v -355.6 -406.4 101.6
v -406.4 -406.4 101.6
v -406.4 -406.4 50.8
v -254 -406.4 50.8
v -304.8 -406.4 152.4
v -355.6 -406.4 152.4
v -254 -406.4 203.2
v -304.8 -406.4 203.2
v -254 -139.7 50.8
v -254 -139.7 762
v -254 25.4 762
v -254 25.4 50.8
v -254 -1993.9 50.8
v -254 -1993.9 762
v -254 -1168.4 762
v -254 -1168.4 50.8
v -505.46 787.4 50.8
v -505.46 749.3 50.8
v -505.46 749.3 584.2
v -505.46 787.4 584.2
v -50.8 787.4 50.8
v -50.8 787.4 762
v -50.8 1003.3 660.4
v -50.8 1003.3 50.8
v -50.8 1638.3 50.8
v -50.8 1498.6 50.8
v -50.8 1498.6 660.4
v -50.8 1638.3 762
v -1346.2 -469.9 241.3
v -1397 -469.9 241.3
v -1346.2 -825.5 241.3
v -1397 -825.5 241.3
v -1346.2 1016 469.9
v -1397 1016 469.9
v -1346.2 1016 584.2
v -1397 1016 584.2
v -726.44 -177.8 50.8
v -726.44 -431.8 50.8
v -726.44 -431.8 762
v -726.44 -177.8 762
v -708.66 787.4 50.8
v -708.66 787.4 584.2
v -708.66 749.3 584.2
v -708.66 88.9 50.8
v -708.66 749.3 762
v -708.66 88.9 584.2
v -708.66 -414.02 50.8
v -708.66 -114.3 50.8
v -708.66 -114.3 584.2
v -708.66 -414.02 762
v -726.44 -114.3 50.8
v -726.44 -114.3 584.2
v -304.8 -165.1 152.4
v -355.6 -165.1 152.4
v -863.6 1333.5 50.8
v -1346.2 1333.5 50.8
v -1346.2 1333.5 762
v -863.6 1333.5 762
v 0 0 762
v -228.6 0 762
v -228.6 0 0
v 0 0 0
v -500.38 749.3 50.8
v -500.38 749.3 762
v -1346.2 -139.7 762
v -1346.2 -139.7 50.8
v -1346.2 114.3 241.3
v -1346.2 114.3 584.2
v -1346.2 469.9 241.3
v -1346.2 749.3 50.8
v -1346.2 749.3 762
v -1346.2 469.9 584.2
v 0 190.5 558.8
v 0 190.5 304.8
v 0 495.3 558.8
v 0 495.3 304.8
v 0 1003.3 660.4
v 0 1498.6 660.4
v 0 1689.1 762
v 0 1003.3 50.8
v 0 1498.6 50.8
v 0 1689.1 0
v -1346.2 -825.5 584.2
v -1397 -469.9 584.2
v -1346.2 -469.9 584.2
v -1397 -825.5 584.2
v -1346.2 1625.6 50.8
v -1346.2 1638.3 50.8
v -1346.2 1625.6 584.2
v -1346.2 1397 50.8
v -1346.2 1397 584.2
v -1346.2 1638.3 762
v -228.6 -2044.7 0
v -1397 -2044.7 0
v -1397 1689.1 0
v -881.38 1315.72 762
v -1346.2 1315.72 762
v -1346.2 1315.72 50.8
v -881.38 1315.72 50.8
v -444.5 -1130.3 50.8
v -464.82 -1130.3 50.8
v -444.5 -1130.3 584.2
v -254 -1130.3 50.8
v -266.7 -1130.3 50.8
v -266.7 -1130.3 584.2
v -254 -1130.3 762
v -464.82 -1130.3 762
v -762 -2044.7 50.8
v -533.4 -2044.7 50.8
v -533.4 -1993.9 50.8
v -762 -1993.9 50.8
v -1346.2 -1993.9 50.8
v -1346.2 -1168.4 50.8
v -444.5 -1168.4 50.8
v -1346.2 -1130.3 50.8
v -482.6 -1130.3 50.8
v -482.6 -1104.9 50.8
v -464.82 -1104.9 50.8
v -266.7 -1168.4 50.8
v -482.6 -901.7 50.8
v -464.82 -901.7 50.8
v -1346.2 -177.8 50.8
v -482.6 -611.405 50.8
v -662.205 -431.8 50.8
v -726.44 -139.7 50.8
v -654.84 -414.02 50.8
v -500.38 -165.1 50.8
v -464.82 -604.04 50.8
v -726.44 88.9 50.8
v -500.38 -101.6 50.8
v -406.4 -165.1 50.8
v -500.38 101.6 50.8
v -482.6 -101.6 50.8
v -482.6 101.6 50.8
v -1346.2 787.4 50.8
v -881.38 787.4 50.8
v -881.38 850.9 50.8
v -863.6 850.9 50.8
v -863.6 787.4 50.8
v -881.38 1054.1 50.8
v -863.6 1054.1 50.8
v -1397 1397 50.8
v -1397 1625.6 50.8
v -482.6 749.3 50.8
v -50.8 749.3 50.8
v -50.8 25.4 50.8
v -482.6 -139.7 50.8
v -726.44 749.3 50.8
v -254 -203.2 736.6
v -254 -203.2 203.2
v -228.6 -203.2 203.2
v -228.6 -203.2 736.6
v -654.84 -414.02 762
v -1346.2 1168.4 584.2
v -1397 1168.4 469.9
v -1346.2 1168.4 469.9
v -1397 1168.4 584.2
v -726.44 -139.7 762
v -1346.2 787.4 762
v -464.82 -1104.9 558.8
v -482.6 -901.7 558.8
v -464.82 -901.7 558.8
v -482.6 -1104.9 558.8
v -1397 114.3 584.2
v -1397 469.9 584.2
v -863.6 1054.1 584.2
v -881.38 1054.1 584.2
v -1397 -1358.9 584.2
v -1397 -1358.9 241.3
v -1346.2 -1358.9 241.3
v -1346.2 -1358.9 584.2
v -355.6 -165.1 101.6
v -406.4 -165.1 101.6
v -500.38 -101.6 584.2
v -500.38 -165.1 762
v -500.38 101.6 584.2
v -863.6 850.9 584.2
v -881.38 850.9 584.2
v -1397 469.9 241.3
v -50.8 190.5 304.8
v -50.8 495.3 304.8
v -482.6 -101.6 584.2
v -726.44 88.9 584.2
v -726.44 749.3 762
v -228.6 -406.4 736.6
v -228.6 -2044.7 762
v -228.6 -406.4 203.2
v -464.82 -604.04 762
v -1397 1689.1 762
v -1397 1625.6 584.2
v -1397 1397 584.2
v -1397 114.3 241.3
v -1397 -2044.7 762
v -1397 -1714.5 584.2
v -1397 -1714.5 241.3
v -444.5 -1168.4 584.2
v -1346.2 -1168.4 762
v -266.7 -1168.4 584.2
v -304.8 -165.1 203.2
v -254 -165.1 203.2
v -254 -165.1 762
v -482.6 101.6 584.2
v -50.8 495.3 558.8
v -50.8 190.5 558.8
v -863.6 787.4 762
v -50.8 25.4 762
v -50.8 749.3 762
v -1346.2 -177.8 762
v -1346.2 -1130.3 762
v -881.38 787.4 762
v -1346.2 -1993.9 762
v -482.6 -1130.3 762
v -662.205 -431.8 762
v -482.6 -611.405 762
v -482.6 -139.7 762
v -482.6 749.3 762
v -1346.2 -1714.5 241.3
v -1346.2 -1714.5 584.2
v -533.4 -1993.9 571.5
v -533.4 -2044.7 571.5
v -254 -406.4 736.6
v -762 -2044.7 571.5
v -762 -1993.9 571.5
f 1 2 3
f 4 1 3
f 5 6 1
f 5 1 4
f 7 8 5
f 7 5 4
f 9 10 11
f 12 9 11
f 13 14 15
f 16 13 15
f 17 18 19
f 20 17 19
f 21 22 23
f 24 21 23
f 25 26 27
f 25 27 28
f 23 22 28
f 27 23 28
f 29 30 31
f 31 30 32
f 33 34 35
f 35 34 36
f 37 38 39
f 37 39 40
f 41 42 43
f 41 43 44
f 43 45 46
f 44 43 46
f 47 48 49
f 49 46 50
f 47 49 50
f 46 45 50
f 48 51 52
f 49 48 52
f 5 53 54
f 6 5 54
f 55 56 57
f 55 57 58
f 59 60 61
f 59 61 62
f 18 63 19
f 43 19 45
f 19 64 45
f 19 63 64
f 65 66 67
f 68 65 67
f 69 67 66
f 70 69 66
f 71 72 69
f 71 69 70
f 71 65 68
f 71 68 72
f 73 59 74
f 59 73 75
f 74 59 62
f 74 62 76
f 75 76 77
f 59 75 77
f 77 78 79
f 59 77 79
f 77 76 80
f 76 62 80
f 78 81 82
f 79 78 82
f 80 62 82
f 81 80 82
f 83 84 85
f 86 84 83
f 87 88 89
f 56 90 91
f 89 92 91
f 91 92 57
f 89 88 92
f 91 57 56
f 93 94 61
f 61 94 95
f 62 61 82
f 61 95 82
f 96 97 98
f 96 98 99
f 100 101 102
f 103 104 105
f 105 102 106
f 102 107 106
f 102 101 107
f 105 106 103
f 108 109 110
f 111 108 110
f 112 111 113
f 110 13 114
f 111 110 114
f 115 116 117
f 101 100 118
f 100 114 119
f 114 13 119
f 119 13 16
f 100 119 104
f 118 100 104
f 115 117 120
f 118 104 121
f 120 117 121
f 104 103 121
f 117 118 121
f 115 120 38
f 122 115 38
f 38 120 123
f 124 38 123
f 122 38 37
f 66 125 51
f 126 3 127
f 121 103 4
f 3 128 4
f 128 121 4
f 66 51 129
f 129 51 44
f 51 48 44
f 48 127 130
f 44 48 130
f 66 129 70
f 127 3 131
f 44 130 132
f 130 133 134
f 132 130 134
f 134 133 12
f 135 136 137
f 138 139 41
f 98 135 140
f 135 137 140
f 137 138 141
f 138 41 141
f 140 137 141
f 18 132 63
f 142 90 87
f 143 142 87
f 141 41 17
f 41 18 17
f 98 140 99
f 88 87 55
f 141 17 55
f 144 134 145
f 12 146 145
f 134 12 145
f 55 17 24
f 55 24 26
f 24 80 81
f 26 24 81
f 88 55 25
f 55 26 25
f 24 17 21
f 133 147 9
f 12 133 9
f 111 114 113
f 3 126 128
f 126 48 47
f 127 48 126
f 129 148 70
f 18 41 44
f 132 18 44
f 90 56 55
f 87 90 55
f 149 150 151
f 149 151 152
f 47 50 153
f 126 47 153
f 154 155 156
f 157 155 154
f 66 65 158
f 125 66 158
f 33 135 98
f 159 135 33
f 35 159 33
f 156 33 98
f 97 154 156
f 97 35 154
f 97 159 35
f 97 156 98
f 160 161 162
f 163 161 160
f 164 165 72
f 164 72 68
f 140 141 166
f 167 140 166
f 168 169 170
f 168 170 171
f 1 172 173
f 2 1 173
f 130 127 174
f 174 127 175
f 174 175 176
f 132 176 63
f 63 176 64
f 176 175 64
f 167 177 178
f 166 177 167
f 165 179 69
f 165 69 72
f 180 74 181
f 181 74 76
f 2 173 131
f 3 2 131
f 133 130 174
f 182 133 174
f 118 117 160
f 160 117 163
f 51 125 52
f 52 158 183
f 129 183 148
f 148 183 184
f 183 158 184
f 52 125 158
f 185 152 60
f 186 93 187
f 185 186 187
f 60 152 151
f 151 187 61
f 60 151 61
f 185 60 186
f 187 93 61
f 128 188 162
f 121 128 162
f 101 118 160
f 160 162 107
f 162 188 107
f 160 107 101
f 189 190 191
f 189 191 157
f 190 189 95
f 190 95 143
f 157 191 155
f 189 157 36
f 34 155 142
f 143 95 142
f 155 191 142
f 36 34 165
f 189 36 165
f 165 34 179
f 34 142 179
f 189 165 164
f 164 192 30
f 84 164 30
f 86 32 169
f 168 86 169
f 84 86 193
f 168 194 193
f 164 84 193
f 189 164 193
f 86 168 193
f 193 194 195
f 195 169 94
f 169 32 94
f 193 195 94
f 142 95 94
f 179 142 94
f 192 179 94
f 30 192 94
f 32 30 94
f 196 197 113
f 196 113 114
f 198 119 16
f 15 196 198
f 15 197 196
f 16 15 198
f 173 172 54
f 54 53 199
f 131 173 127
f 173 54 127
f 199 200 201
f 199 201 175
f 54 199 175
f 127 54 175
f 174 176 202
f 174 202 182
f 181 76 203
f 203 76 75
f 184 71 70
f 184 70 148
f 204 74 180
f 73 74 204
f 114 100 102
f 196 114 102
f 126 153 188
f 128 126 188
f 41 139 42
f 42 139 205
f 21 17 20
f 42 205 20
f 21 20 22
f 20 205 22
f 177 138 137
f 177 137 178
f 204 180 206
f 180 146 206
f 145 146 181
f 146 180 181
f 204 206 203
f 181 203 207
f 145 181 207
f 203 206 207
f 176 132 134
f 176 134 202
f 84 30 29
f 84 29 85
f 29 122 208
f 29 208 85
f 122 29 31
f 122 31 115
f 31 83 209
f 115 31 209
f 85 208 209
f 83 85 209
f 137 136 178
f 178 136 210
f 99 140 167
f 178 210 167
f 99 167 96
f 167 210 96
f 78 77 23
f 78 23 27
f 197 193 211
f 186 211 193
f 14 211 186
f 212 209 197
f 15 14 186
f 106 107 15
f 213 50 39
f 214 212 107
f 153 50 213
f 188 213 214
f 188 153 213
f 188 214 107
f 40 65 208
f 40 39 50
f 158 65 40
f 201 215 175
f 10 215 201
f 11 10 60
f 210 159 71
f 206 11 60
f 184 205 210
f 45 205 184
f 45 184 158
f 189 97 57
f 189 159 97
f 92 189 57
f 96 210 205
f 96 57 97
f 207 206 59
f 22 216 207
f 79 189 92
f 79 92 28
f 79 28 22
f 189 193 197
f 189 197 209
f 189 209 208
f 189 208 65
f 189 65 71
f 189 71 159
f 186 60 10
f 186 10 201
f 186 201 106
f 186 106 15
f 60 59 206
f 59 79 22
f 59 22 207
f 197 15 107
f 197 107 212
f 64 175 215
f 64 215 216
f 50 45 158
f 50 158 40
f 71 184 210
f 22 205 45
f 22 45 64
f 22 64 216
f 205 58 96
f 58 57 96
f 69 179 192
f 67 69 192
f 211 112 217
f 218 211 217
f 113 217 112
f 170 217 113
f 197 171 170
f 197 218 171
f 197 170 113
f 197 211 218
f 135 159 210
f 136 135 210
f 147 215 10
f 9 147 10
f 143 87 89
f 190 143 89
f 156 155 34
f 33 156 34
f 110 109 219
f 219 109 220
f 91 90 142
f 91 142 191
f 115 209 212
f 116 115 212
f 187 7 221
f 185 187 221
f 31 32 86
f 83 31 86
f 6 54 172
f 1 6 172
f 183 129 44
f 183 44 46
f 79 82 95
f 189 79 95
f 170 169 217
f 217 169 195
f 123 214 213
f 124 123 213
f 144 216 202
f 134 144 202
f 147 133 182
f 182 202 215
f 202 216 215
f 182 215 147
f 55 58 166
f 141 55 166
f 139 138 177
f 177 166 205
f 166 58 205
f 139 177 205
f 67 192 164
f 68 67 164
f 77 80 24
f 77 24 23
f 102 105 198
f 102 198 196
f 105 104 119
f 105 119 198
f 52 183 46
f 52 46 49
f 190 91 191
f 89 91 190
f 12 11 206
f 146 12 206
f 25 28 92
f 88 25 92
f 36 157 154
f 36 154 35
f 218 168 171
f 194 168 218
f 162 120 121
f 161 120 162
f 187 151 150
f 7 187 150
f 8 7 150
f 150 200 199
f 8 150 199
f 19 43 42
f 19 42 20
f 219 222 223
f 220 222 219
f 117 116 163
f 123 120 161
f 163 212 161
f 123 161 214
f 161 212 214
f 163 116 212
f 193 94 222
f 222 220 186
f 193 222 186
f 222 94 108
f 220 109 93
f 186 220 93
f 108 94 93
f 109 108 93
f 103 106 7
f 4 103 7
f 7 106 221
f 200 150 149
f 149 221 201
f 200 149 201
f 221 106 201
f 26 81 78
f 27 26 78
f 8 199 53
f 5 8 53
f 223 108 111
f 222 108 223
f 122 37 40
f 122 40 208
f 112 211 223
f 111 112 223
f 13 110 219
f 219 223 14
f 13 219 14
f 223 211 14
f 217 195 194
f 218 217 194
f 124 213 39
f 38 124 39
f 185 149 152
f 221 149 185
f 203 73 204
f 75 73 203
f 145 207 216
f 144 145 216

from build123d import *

# Parameters (mm, degrees)
F1_DEPTH  = 762
F3_DEPTH  = 711.2
F4_W      = 464.82
F4_H      = 528.32
F5_DEPTH  = 711.2
F6_W      = 619.76
F6_H      = 889
F7_DEPTH  = 711.2
F8_W      = 1092.2
F8_H      = 825.5
F9_DEPTH  = 711.2
F11_DEPTH = 711.2
F13_DEPTH = 711.2
F15_DEPTH = 711.2
F16_W     = 203.2
F16_H     = 533.4
F17_DEPTH = 25.4
F18_W     = 203.2
F18_H     = 508
F19_DEPTH = 17.78
F20_W     = 203.2
F20_H     = 533.4
F21_DEPTH = 17.78
F22_W     = 177.8
F22_H     = 533.4
F23_DEPTH = 38.1
F24_W     = 203.2
F24_H     = 533.4
F25_DEPTH = 38.1
F26_W     = 203.2
F26_H     = 533.4
F27_DEPTH = 17.78
F28_W     = 228.6
F28_H     = 533.4
F29_DEPTH = 50.8
F30_W     = 355.6
F30_H     = 342.9
F30_W_2   = 152.4
F30_H_2   = 114.3
F31_DEPTH = 50.8
F32_W     = 304.8
F32_H     = 254
F32_W_2   = 495.3
F32_H_2   = 609.6
F33_DEPTH = 50.8
F34_W     = 228.6
F34_H     = 520.7
F35_DEPTH = 50.8
F37_DEPTH = 241.3
F38_W     = 203.2
F38_H     = 533.4
F39_DEPTH = 17.78


with BuildPart() as f1:
    # F0 (on Top) → F1 (new body)
    with BuildSketch(Plane.XY):
        Polygon((-1397, 1689.1), (-1397, -2044.7), (-228.6, -2044.7), (-228.6, 0), (0, 0), (0, 1689.1), align=None)
    extrude(amount=F1_DEPTH)

    # F2 (on face) → F3 (cut)
    with BuildSketch(Plane.XY.offset(762)):
        Polygon((-50.8, 1638.3), (-1346.2, 1638.3), (-1346.2, 1333.5), (-863.6, 1333.5), (-863.6, 787.4), (-50.8, 787.4), align=None)
    extrude(amount=-F3_DEPTH, mode=Mode.SUBTRACT)

    # F4 (on face) → F5 (cut)
    with BuildSketch(Plane.XY.offset(762)):
        with Locations((-1113.79, 1051.56)):
            Rectangle(F4_W, F4_H)
    extrude(amount=-F5_DEPTH, mode=Mode.SUBTRACT)

    # F6 (on face) → F7 (cut)
    with BuildSketch(Plane.XY.offset(762)):
        with Locations((-1036.32, 304.8)):
            Rectangle(F6_W, F6_H)
    extrude(amount=-F7_DEPTH, mode=Mode.SUBTRACT)

    # F8 (on face) → F9 (cut)
    with BuildSketch(Plane.XY.offset(762)):
        with Locations((-800.1, -1581.15)):
            Rectangle(F8_W, F8_H)
    extrude(amount=-F9_DEPTH, mode=Mode.SUBTRACT)

    # F10 (on face) → F11 (cut)
    with BuildSketch(Plane.XY.offset(762)):
        Polygon((-726.44, -177.8), (-1346.2, -177.8), (-1346.2, -1130.3), (-482.6, -1130.3), (-482.6, -611.405122), (-662.205122, -431.8), (-726.44, -431.8), align=None)
    extrude(amount=-F11_DEPTH, mode=Mode.SUBTRACT)

    # F12 (on face) → F13 (cut)
    with BuildSketch(Plane.XY.offset(762)):
        Polygon((-50.8, 749.3), (-482.6, 749.3), (-482.6, -139.7), (-254, -139.7), (-254, 25.4), (-50.8, 25.4), align=None)
    extrude(amount=-F13_DEPTH, mode=Mode.SUBTRACT)

    # F14 (on face) → F15 (cut)
    with BuildSketch(Plane.XY.offset(762)):
        Polygon((-500.38, 749.3), (-708.66, 749.3), (-708.66, -414.02), (-654.840405, -414.02), (-464.82, -604.040405), (-464.82, -1130.3), (-254, -1130.3), (-254, -165.1), (-500.38, -165.1), align=None)
    extrude(amount=-F15_DEPTH, mode=Mode.SUBTRACT)

    # F16 (on face) → F17 (cut, through all)
    with BuildSketch(Plane(origin=(-254, 0, 0), x_dir=(0, -1, 0), z_dir=(-1, 0, 0))):
        with Locations((304.8, 469.9)):
            Rectangle(F16_W, F16_H)
    extrude(amount=-F17_DEPTH, mode=Mode.SUBTRACT)

    # F18 (on face) → F19 (cut, through all)
    with BuildSketch(Plane(origin=(-482.6, 0, 0), x_dir=(0, -1, 0), z_dir=(-1, 0, 0))):
        with Locations((1003.3, 304.8)):
            Rectangle(F18_W, F18_H)
    extrude(amount=-F19_DEPTH, mode=Mode.SUBTRACT)

    # F20 (on face) → F21 (cut, through all)
    with BuildSketch(Plane(origin=(-726.44, 0, 0), x_dir=(0, -1, 0), z_dir=(-1, 0, 0))):
        with Locations((12.7, 317.5)):
            Rectangle(F20_W, F20_H)
    extrude(amount=-F21_DEPTH, mode=Mode.SUBTRACT)

    # F22 (on face) → F23 (cut, through all)
    with BuildSketch(Plane(origin=(0, -1130.3, 0), x_dir=(-1, 0, 0), z_dir=(0, 1, 0))):
        with Locations((355.6, 317.5)):
            Rectangle(F22_W, F22_H)
    extrude(amount=-F23_DEPTH, mode=Mode.SUBTRACT)

    # F24 (on face) → F25 (cut, through all)
    with BuildSketch(Plane.XZ.offset(-749.3)):
        with Locations((-607.06, 317.5)):
            Rectangle(F24_W, F24_H)
    extrude(amount=-F25_DEPTH, mode=Mode.SUBTRACT)

    # F26 (on face) → F27 (cut, through all)
    with BuildSketch(Plane.YZ.offset(-863.6)):
        with Locations((952.5, 317.5)):
            Rectangle(F26_W, F26_H)
    extrude(amount=-F27_DEPTH, mode=Mode.SUBTRACT)

    # F28 (on face) → F29 (cut, through all)
    with BuildSketch(Plane.YZ.offset(-1346.2)):
        with Locations((1511.3, 317.5)):
            Rectangle(F28_W, F28_H)
    extrude(amount=-F29_DEPTH, mode=Mode.SUBTRACT)

    # F30 (on face) → F31 (cut, through all)
    with BuildSketch(Plane(origin=(-1397, 0, 0), x_dir=(0, -1, 0), z_dir=(-1, 0, 0))):
        with Locations((1536.7, 412.75)):
            Rectangle(F30_W, F30_H)
        with Locations((647.7, 412.75)):
            Rectangle(F30_W, F30_H)
        with Locations((-292.1, 412.75)):
            Rectangle(F30_W, F30_H)
        with Locations((-1092.2, 527.05)):
            Rectangle(F30_W_2, F30_H_2)
    extrude(amount=-F31_DEPTH, mode=Mode.SUBTRACT)

    # F32 (on face) → F33 (cut, through all)
    with BuildSketch(Plane.YZ):
        with Locations((342.9, 431.8)):
            Rectangle(F32_W, F32_H)
        with Locations((1250.95, 355.6)):
            Rectangle(F32_W_2, F32_H_2)
    extrude(amount=-F33_DEPTH, mode=Mode.SUBTRACT)

    # F34 (on face) → F35 (cut, through all)
    with BuildSketch(Plane.XZ.offset(2044.7)):
        with Locations((-647.7, 311.15)):
            Rectangle(F34_W, F34_H)
    extrude(amount=-F35_DEPTH, mode=Mode.SUBTRACT)

    # F36 (on face) → F37 (join, through all)
    with BuildSketch(Plane.XZ.offset(165.1)):
        Polygon((-406.4, 50.8), (-254, 50.8), (-254, 203.2), (-304.8, 203.2), (-304.8, 152.4), (-355.6, 152.4), (-355.6, 101.6), (-406.4, 101.6), align=None)
    extrude(amount=F37_DEPTH)

    # F38 (on face) → F39 (cut, through all)
    with BuildSketch(Plane(origin=(-500.38, 0, 0), x_dir=(0, -1, 0), z_dir=(-1, 0, 0))):
        with Locations((0, 317.5)):
            Rectangle(F38_W, F38_H)
    extrude(amount=-F39_DEPTH, mode=Mode.SUBTRACT)


solid = f1.part
